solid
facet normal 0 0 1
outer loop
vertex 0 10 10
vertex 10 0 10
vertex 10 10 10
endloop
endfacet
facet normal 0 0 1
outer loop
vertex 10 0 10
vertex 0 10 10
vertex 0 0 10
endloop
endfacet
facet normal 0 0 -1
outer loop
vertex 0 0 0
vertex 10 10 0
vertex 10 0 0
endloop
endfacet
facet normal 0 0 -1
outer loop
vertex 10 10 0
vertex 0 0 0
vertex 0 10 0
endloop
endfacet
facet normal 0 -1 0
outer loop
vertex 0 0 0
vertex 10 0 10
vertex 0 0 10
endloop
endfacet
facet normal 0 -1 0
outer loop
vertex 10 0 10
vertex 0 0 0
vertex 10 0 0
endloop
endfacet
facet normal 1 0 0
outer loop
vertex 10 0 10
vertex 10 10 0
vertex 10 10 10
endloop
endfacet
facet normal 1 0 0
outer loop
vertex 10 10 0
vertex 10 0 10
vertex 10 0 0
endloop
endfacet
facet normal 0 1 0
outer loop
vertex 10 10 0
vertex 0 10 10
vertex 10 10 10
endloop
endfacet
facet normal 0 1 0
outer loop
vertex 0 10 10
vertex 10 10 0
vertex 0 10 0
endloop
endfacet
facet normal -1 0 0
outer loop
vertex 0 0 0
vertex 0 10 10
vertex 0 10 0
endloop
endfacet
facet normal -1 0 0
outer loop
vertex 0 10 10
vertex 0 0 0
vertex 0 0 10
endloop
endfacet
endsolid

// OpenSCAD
cube(size = 10);
/* Generated from the following ExpSolid code:

#! /usr/bin/env python

from pathlib import Path

from solid2 import *

# =============
# = Extension =
# =============
# This is more or less the same as -- regular -- SolidPython does when it
# writes a scad file. It appends the python source to the end of the *.scad
# file.
#
# If you like this, you can simply import this extension that should do it.
#
def attach_code_post_render(root):
    #find the "root" file
    calling_file = None

    import __main__
    # not called from a terminal?
    if hasattr(__main__, "__file__"):
        # extract filename and replace suffix
        calling_file = Path(__main__.__file__).absolute()
    else:
        return '' # no code available. Called from withing a python shell

    assert(calling_file.exists())

    # read source file
    with calling_file.open("r") as f:
        code_str = f.read()

        # escape /_* and *_/ because otherwise it would end this comment block which
        # we use to inject the solid code
        code_str = code_str.replace("/_*", "/_*")
        code_str = code_str.replace("*_/", "*_/")

        # return the string to be appended to the *.scad file
        return f'/_* Generated from the following ExpSolid code:\n\n' +\
               f'{code_str}*_/'

    assert(False)

# register the post_render extension. This hooks it into the "_render" routine.
# It will be called after the root gets rendered. It's return string will be
# appended to the rendered string.
from solid2.core.extension_manager import default_extension_manager
default_extension_manager.register_post_render(attach_code_post_render)

# =============

if __name__ == "__main__":
    c = cube(10)
    c.save_as_scad()

*/
